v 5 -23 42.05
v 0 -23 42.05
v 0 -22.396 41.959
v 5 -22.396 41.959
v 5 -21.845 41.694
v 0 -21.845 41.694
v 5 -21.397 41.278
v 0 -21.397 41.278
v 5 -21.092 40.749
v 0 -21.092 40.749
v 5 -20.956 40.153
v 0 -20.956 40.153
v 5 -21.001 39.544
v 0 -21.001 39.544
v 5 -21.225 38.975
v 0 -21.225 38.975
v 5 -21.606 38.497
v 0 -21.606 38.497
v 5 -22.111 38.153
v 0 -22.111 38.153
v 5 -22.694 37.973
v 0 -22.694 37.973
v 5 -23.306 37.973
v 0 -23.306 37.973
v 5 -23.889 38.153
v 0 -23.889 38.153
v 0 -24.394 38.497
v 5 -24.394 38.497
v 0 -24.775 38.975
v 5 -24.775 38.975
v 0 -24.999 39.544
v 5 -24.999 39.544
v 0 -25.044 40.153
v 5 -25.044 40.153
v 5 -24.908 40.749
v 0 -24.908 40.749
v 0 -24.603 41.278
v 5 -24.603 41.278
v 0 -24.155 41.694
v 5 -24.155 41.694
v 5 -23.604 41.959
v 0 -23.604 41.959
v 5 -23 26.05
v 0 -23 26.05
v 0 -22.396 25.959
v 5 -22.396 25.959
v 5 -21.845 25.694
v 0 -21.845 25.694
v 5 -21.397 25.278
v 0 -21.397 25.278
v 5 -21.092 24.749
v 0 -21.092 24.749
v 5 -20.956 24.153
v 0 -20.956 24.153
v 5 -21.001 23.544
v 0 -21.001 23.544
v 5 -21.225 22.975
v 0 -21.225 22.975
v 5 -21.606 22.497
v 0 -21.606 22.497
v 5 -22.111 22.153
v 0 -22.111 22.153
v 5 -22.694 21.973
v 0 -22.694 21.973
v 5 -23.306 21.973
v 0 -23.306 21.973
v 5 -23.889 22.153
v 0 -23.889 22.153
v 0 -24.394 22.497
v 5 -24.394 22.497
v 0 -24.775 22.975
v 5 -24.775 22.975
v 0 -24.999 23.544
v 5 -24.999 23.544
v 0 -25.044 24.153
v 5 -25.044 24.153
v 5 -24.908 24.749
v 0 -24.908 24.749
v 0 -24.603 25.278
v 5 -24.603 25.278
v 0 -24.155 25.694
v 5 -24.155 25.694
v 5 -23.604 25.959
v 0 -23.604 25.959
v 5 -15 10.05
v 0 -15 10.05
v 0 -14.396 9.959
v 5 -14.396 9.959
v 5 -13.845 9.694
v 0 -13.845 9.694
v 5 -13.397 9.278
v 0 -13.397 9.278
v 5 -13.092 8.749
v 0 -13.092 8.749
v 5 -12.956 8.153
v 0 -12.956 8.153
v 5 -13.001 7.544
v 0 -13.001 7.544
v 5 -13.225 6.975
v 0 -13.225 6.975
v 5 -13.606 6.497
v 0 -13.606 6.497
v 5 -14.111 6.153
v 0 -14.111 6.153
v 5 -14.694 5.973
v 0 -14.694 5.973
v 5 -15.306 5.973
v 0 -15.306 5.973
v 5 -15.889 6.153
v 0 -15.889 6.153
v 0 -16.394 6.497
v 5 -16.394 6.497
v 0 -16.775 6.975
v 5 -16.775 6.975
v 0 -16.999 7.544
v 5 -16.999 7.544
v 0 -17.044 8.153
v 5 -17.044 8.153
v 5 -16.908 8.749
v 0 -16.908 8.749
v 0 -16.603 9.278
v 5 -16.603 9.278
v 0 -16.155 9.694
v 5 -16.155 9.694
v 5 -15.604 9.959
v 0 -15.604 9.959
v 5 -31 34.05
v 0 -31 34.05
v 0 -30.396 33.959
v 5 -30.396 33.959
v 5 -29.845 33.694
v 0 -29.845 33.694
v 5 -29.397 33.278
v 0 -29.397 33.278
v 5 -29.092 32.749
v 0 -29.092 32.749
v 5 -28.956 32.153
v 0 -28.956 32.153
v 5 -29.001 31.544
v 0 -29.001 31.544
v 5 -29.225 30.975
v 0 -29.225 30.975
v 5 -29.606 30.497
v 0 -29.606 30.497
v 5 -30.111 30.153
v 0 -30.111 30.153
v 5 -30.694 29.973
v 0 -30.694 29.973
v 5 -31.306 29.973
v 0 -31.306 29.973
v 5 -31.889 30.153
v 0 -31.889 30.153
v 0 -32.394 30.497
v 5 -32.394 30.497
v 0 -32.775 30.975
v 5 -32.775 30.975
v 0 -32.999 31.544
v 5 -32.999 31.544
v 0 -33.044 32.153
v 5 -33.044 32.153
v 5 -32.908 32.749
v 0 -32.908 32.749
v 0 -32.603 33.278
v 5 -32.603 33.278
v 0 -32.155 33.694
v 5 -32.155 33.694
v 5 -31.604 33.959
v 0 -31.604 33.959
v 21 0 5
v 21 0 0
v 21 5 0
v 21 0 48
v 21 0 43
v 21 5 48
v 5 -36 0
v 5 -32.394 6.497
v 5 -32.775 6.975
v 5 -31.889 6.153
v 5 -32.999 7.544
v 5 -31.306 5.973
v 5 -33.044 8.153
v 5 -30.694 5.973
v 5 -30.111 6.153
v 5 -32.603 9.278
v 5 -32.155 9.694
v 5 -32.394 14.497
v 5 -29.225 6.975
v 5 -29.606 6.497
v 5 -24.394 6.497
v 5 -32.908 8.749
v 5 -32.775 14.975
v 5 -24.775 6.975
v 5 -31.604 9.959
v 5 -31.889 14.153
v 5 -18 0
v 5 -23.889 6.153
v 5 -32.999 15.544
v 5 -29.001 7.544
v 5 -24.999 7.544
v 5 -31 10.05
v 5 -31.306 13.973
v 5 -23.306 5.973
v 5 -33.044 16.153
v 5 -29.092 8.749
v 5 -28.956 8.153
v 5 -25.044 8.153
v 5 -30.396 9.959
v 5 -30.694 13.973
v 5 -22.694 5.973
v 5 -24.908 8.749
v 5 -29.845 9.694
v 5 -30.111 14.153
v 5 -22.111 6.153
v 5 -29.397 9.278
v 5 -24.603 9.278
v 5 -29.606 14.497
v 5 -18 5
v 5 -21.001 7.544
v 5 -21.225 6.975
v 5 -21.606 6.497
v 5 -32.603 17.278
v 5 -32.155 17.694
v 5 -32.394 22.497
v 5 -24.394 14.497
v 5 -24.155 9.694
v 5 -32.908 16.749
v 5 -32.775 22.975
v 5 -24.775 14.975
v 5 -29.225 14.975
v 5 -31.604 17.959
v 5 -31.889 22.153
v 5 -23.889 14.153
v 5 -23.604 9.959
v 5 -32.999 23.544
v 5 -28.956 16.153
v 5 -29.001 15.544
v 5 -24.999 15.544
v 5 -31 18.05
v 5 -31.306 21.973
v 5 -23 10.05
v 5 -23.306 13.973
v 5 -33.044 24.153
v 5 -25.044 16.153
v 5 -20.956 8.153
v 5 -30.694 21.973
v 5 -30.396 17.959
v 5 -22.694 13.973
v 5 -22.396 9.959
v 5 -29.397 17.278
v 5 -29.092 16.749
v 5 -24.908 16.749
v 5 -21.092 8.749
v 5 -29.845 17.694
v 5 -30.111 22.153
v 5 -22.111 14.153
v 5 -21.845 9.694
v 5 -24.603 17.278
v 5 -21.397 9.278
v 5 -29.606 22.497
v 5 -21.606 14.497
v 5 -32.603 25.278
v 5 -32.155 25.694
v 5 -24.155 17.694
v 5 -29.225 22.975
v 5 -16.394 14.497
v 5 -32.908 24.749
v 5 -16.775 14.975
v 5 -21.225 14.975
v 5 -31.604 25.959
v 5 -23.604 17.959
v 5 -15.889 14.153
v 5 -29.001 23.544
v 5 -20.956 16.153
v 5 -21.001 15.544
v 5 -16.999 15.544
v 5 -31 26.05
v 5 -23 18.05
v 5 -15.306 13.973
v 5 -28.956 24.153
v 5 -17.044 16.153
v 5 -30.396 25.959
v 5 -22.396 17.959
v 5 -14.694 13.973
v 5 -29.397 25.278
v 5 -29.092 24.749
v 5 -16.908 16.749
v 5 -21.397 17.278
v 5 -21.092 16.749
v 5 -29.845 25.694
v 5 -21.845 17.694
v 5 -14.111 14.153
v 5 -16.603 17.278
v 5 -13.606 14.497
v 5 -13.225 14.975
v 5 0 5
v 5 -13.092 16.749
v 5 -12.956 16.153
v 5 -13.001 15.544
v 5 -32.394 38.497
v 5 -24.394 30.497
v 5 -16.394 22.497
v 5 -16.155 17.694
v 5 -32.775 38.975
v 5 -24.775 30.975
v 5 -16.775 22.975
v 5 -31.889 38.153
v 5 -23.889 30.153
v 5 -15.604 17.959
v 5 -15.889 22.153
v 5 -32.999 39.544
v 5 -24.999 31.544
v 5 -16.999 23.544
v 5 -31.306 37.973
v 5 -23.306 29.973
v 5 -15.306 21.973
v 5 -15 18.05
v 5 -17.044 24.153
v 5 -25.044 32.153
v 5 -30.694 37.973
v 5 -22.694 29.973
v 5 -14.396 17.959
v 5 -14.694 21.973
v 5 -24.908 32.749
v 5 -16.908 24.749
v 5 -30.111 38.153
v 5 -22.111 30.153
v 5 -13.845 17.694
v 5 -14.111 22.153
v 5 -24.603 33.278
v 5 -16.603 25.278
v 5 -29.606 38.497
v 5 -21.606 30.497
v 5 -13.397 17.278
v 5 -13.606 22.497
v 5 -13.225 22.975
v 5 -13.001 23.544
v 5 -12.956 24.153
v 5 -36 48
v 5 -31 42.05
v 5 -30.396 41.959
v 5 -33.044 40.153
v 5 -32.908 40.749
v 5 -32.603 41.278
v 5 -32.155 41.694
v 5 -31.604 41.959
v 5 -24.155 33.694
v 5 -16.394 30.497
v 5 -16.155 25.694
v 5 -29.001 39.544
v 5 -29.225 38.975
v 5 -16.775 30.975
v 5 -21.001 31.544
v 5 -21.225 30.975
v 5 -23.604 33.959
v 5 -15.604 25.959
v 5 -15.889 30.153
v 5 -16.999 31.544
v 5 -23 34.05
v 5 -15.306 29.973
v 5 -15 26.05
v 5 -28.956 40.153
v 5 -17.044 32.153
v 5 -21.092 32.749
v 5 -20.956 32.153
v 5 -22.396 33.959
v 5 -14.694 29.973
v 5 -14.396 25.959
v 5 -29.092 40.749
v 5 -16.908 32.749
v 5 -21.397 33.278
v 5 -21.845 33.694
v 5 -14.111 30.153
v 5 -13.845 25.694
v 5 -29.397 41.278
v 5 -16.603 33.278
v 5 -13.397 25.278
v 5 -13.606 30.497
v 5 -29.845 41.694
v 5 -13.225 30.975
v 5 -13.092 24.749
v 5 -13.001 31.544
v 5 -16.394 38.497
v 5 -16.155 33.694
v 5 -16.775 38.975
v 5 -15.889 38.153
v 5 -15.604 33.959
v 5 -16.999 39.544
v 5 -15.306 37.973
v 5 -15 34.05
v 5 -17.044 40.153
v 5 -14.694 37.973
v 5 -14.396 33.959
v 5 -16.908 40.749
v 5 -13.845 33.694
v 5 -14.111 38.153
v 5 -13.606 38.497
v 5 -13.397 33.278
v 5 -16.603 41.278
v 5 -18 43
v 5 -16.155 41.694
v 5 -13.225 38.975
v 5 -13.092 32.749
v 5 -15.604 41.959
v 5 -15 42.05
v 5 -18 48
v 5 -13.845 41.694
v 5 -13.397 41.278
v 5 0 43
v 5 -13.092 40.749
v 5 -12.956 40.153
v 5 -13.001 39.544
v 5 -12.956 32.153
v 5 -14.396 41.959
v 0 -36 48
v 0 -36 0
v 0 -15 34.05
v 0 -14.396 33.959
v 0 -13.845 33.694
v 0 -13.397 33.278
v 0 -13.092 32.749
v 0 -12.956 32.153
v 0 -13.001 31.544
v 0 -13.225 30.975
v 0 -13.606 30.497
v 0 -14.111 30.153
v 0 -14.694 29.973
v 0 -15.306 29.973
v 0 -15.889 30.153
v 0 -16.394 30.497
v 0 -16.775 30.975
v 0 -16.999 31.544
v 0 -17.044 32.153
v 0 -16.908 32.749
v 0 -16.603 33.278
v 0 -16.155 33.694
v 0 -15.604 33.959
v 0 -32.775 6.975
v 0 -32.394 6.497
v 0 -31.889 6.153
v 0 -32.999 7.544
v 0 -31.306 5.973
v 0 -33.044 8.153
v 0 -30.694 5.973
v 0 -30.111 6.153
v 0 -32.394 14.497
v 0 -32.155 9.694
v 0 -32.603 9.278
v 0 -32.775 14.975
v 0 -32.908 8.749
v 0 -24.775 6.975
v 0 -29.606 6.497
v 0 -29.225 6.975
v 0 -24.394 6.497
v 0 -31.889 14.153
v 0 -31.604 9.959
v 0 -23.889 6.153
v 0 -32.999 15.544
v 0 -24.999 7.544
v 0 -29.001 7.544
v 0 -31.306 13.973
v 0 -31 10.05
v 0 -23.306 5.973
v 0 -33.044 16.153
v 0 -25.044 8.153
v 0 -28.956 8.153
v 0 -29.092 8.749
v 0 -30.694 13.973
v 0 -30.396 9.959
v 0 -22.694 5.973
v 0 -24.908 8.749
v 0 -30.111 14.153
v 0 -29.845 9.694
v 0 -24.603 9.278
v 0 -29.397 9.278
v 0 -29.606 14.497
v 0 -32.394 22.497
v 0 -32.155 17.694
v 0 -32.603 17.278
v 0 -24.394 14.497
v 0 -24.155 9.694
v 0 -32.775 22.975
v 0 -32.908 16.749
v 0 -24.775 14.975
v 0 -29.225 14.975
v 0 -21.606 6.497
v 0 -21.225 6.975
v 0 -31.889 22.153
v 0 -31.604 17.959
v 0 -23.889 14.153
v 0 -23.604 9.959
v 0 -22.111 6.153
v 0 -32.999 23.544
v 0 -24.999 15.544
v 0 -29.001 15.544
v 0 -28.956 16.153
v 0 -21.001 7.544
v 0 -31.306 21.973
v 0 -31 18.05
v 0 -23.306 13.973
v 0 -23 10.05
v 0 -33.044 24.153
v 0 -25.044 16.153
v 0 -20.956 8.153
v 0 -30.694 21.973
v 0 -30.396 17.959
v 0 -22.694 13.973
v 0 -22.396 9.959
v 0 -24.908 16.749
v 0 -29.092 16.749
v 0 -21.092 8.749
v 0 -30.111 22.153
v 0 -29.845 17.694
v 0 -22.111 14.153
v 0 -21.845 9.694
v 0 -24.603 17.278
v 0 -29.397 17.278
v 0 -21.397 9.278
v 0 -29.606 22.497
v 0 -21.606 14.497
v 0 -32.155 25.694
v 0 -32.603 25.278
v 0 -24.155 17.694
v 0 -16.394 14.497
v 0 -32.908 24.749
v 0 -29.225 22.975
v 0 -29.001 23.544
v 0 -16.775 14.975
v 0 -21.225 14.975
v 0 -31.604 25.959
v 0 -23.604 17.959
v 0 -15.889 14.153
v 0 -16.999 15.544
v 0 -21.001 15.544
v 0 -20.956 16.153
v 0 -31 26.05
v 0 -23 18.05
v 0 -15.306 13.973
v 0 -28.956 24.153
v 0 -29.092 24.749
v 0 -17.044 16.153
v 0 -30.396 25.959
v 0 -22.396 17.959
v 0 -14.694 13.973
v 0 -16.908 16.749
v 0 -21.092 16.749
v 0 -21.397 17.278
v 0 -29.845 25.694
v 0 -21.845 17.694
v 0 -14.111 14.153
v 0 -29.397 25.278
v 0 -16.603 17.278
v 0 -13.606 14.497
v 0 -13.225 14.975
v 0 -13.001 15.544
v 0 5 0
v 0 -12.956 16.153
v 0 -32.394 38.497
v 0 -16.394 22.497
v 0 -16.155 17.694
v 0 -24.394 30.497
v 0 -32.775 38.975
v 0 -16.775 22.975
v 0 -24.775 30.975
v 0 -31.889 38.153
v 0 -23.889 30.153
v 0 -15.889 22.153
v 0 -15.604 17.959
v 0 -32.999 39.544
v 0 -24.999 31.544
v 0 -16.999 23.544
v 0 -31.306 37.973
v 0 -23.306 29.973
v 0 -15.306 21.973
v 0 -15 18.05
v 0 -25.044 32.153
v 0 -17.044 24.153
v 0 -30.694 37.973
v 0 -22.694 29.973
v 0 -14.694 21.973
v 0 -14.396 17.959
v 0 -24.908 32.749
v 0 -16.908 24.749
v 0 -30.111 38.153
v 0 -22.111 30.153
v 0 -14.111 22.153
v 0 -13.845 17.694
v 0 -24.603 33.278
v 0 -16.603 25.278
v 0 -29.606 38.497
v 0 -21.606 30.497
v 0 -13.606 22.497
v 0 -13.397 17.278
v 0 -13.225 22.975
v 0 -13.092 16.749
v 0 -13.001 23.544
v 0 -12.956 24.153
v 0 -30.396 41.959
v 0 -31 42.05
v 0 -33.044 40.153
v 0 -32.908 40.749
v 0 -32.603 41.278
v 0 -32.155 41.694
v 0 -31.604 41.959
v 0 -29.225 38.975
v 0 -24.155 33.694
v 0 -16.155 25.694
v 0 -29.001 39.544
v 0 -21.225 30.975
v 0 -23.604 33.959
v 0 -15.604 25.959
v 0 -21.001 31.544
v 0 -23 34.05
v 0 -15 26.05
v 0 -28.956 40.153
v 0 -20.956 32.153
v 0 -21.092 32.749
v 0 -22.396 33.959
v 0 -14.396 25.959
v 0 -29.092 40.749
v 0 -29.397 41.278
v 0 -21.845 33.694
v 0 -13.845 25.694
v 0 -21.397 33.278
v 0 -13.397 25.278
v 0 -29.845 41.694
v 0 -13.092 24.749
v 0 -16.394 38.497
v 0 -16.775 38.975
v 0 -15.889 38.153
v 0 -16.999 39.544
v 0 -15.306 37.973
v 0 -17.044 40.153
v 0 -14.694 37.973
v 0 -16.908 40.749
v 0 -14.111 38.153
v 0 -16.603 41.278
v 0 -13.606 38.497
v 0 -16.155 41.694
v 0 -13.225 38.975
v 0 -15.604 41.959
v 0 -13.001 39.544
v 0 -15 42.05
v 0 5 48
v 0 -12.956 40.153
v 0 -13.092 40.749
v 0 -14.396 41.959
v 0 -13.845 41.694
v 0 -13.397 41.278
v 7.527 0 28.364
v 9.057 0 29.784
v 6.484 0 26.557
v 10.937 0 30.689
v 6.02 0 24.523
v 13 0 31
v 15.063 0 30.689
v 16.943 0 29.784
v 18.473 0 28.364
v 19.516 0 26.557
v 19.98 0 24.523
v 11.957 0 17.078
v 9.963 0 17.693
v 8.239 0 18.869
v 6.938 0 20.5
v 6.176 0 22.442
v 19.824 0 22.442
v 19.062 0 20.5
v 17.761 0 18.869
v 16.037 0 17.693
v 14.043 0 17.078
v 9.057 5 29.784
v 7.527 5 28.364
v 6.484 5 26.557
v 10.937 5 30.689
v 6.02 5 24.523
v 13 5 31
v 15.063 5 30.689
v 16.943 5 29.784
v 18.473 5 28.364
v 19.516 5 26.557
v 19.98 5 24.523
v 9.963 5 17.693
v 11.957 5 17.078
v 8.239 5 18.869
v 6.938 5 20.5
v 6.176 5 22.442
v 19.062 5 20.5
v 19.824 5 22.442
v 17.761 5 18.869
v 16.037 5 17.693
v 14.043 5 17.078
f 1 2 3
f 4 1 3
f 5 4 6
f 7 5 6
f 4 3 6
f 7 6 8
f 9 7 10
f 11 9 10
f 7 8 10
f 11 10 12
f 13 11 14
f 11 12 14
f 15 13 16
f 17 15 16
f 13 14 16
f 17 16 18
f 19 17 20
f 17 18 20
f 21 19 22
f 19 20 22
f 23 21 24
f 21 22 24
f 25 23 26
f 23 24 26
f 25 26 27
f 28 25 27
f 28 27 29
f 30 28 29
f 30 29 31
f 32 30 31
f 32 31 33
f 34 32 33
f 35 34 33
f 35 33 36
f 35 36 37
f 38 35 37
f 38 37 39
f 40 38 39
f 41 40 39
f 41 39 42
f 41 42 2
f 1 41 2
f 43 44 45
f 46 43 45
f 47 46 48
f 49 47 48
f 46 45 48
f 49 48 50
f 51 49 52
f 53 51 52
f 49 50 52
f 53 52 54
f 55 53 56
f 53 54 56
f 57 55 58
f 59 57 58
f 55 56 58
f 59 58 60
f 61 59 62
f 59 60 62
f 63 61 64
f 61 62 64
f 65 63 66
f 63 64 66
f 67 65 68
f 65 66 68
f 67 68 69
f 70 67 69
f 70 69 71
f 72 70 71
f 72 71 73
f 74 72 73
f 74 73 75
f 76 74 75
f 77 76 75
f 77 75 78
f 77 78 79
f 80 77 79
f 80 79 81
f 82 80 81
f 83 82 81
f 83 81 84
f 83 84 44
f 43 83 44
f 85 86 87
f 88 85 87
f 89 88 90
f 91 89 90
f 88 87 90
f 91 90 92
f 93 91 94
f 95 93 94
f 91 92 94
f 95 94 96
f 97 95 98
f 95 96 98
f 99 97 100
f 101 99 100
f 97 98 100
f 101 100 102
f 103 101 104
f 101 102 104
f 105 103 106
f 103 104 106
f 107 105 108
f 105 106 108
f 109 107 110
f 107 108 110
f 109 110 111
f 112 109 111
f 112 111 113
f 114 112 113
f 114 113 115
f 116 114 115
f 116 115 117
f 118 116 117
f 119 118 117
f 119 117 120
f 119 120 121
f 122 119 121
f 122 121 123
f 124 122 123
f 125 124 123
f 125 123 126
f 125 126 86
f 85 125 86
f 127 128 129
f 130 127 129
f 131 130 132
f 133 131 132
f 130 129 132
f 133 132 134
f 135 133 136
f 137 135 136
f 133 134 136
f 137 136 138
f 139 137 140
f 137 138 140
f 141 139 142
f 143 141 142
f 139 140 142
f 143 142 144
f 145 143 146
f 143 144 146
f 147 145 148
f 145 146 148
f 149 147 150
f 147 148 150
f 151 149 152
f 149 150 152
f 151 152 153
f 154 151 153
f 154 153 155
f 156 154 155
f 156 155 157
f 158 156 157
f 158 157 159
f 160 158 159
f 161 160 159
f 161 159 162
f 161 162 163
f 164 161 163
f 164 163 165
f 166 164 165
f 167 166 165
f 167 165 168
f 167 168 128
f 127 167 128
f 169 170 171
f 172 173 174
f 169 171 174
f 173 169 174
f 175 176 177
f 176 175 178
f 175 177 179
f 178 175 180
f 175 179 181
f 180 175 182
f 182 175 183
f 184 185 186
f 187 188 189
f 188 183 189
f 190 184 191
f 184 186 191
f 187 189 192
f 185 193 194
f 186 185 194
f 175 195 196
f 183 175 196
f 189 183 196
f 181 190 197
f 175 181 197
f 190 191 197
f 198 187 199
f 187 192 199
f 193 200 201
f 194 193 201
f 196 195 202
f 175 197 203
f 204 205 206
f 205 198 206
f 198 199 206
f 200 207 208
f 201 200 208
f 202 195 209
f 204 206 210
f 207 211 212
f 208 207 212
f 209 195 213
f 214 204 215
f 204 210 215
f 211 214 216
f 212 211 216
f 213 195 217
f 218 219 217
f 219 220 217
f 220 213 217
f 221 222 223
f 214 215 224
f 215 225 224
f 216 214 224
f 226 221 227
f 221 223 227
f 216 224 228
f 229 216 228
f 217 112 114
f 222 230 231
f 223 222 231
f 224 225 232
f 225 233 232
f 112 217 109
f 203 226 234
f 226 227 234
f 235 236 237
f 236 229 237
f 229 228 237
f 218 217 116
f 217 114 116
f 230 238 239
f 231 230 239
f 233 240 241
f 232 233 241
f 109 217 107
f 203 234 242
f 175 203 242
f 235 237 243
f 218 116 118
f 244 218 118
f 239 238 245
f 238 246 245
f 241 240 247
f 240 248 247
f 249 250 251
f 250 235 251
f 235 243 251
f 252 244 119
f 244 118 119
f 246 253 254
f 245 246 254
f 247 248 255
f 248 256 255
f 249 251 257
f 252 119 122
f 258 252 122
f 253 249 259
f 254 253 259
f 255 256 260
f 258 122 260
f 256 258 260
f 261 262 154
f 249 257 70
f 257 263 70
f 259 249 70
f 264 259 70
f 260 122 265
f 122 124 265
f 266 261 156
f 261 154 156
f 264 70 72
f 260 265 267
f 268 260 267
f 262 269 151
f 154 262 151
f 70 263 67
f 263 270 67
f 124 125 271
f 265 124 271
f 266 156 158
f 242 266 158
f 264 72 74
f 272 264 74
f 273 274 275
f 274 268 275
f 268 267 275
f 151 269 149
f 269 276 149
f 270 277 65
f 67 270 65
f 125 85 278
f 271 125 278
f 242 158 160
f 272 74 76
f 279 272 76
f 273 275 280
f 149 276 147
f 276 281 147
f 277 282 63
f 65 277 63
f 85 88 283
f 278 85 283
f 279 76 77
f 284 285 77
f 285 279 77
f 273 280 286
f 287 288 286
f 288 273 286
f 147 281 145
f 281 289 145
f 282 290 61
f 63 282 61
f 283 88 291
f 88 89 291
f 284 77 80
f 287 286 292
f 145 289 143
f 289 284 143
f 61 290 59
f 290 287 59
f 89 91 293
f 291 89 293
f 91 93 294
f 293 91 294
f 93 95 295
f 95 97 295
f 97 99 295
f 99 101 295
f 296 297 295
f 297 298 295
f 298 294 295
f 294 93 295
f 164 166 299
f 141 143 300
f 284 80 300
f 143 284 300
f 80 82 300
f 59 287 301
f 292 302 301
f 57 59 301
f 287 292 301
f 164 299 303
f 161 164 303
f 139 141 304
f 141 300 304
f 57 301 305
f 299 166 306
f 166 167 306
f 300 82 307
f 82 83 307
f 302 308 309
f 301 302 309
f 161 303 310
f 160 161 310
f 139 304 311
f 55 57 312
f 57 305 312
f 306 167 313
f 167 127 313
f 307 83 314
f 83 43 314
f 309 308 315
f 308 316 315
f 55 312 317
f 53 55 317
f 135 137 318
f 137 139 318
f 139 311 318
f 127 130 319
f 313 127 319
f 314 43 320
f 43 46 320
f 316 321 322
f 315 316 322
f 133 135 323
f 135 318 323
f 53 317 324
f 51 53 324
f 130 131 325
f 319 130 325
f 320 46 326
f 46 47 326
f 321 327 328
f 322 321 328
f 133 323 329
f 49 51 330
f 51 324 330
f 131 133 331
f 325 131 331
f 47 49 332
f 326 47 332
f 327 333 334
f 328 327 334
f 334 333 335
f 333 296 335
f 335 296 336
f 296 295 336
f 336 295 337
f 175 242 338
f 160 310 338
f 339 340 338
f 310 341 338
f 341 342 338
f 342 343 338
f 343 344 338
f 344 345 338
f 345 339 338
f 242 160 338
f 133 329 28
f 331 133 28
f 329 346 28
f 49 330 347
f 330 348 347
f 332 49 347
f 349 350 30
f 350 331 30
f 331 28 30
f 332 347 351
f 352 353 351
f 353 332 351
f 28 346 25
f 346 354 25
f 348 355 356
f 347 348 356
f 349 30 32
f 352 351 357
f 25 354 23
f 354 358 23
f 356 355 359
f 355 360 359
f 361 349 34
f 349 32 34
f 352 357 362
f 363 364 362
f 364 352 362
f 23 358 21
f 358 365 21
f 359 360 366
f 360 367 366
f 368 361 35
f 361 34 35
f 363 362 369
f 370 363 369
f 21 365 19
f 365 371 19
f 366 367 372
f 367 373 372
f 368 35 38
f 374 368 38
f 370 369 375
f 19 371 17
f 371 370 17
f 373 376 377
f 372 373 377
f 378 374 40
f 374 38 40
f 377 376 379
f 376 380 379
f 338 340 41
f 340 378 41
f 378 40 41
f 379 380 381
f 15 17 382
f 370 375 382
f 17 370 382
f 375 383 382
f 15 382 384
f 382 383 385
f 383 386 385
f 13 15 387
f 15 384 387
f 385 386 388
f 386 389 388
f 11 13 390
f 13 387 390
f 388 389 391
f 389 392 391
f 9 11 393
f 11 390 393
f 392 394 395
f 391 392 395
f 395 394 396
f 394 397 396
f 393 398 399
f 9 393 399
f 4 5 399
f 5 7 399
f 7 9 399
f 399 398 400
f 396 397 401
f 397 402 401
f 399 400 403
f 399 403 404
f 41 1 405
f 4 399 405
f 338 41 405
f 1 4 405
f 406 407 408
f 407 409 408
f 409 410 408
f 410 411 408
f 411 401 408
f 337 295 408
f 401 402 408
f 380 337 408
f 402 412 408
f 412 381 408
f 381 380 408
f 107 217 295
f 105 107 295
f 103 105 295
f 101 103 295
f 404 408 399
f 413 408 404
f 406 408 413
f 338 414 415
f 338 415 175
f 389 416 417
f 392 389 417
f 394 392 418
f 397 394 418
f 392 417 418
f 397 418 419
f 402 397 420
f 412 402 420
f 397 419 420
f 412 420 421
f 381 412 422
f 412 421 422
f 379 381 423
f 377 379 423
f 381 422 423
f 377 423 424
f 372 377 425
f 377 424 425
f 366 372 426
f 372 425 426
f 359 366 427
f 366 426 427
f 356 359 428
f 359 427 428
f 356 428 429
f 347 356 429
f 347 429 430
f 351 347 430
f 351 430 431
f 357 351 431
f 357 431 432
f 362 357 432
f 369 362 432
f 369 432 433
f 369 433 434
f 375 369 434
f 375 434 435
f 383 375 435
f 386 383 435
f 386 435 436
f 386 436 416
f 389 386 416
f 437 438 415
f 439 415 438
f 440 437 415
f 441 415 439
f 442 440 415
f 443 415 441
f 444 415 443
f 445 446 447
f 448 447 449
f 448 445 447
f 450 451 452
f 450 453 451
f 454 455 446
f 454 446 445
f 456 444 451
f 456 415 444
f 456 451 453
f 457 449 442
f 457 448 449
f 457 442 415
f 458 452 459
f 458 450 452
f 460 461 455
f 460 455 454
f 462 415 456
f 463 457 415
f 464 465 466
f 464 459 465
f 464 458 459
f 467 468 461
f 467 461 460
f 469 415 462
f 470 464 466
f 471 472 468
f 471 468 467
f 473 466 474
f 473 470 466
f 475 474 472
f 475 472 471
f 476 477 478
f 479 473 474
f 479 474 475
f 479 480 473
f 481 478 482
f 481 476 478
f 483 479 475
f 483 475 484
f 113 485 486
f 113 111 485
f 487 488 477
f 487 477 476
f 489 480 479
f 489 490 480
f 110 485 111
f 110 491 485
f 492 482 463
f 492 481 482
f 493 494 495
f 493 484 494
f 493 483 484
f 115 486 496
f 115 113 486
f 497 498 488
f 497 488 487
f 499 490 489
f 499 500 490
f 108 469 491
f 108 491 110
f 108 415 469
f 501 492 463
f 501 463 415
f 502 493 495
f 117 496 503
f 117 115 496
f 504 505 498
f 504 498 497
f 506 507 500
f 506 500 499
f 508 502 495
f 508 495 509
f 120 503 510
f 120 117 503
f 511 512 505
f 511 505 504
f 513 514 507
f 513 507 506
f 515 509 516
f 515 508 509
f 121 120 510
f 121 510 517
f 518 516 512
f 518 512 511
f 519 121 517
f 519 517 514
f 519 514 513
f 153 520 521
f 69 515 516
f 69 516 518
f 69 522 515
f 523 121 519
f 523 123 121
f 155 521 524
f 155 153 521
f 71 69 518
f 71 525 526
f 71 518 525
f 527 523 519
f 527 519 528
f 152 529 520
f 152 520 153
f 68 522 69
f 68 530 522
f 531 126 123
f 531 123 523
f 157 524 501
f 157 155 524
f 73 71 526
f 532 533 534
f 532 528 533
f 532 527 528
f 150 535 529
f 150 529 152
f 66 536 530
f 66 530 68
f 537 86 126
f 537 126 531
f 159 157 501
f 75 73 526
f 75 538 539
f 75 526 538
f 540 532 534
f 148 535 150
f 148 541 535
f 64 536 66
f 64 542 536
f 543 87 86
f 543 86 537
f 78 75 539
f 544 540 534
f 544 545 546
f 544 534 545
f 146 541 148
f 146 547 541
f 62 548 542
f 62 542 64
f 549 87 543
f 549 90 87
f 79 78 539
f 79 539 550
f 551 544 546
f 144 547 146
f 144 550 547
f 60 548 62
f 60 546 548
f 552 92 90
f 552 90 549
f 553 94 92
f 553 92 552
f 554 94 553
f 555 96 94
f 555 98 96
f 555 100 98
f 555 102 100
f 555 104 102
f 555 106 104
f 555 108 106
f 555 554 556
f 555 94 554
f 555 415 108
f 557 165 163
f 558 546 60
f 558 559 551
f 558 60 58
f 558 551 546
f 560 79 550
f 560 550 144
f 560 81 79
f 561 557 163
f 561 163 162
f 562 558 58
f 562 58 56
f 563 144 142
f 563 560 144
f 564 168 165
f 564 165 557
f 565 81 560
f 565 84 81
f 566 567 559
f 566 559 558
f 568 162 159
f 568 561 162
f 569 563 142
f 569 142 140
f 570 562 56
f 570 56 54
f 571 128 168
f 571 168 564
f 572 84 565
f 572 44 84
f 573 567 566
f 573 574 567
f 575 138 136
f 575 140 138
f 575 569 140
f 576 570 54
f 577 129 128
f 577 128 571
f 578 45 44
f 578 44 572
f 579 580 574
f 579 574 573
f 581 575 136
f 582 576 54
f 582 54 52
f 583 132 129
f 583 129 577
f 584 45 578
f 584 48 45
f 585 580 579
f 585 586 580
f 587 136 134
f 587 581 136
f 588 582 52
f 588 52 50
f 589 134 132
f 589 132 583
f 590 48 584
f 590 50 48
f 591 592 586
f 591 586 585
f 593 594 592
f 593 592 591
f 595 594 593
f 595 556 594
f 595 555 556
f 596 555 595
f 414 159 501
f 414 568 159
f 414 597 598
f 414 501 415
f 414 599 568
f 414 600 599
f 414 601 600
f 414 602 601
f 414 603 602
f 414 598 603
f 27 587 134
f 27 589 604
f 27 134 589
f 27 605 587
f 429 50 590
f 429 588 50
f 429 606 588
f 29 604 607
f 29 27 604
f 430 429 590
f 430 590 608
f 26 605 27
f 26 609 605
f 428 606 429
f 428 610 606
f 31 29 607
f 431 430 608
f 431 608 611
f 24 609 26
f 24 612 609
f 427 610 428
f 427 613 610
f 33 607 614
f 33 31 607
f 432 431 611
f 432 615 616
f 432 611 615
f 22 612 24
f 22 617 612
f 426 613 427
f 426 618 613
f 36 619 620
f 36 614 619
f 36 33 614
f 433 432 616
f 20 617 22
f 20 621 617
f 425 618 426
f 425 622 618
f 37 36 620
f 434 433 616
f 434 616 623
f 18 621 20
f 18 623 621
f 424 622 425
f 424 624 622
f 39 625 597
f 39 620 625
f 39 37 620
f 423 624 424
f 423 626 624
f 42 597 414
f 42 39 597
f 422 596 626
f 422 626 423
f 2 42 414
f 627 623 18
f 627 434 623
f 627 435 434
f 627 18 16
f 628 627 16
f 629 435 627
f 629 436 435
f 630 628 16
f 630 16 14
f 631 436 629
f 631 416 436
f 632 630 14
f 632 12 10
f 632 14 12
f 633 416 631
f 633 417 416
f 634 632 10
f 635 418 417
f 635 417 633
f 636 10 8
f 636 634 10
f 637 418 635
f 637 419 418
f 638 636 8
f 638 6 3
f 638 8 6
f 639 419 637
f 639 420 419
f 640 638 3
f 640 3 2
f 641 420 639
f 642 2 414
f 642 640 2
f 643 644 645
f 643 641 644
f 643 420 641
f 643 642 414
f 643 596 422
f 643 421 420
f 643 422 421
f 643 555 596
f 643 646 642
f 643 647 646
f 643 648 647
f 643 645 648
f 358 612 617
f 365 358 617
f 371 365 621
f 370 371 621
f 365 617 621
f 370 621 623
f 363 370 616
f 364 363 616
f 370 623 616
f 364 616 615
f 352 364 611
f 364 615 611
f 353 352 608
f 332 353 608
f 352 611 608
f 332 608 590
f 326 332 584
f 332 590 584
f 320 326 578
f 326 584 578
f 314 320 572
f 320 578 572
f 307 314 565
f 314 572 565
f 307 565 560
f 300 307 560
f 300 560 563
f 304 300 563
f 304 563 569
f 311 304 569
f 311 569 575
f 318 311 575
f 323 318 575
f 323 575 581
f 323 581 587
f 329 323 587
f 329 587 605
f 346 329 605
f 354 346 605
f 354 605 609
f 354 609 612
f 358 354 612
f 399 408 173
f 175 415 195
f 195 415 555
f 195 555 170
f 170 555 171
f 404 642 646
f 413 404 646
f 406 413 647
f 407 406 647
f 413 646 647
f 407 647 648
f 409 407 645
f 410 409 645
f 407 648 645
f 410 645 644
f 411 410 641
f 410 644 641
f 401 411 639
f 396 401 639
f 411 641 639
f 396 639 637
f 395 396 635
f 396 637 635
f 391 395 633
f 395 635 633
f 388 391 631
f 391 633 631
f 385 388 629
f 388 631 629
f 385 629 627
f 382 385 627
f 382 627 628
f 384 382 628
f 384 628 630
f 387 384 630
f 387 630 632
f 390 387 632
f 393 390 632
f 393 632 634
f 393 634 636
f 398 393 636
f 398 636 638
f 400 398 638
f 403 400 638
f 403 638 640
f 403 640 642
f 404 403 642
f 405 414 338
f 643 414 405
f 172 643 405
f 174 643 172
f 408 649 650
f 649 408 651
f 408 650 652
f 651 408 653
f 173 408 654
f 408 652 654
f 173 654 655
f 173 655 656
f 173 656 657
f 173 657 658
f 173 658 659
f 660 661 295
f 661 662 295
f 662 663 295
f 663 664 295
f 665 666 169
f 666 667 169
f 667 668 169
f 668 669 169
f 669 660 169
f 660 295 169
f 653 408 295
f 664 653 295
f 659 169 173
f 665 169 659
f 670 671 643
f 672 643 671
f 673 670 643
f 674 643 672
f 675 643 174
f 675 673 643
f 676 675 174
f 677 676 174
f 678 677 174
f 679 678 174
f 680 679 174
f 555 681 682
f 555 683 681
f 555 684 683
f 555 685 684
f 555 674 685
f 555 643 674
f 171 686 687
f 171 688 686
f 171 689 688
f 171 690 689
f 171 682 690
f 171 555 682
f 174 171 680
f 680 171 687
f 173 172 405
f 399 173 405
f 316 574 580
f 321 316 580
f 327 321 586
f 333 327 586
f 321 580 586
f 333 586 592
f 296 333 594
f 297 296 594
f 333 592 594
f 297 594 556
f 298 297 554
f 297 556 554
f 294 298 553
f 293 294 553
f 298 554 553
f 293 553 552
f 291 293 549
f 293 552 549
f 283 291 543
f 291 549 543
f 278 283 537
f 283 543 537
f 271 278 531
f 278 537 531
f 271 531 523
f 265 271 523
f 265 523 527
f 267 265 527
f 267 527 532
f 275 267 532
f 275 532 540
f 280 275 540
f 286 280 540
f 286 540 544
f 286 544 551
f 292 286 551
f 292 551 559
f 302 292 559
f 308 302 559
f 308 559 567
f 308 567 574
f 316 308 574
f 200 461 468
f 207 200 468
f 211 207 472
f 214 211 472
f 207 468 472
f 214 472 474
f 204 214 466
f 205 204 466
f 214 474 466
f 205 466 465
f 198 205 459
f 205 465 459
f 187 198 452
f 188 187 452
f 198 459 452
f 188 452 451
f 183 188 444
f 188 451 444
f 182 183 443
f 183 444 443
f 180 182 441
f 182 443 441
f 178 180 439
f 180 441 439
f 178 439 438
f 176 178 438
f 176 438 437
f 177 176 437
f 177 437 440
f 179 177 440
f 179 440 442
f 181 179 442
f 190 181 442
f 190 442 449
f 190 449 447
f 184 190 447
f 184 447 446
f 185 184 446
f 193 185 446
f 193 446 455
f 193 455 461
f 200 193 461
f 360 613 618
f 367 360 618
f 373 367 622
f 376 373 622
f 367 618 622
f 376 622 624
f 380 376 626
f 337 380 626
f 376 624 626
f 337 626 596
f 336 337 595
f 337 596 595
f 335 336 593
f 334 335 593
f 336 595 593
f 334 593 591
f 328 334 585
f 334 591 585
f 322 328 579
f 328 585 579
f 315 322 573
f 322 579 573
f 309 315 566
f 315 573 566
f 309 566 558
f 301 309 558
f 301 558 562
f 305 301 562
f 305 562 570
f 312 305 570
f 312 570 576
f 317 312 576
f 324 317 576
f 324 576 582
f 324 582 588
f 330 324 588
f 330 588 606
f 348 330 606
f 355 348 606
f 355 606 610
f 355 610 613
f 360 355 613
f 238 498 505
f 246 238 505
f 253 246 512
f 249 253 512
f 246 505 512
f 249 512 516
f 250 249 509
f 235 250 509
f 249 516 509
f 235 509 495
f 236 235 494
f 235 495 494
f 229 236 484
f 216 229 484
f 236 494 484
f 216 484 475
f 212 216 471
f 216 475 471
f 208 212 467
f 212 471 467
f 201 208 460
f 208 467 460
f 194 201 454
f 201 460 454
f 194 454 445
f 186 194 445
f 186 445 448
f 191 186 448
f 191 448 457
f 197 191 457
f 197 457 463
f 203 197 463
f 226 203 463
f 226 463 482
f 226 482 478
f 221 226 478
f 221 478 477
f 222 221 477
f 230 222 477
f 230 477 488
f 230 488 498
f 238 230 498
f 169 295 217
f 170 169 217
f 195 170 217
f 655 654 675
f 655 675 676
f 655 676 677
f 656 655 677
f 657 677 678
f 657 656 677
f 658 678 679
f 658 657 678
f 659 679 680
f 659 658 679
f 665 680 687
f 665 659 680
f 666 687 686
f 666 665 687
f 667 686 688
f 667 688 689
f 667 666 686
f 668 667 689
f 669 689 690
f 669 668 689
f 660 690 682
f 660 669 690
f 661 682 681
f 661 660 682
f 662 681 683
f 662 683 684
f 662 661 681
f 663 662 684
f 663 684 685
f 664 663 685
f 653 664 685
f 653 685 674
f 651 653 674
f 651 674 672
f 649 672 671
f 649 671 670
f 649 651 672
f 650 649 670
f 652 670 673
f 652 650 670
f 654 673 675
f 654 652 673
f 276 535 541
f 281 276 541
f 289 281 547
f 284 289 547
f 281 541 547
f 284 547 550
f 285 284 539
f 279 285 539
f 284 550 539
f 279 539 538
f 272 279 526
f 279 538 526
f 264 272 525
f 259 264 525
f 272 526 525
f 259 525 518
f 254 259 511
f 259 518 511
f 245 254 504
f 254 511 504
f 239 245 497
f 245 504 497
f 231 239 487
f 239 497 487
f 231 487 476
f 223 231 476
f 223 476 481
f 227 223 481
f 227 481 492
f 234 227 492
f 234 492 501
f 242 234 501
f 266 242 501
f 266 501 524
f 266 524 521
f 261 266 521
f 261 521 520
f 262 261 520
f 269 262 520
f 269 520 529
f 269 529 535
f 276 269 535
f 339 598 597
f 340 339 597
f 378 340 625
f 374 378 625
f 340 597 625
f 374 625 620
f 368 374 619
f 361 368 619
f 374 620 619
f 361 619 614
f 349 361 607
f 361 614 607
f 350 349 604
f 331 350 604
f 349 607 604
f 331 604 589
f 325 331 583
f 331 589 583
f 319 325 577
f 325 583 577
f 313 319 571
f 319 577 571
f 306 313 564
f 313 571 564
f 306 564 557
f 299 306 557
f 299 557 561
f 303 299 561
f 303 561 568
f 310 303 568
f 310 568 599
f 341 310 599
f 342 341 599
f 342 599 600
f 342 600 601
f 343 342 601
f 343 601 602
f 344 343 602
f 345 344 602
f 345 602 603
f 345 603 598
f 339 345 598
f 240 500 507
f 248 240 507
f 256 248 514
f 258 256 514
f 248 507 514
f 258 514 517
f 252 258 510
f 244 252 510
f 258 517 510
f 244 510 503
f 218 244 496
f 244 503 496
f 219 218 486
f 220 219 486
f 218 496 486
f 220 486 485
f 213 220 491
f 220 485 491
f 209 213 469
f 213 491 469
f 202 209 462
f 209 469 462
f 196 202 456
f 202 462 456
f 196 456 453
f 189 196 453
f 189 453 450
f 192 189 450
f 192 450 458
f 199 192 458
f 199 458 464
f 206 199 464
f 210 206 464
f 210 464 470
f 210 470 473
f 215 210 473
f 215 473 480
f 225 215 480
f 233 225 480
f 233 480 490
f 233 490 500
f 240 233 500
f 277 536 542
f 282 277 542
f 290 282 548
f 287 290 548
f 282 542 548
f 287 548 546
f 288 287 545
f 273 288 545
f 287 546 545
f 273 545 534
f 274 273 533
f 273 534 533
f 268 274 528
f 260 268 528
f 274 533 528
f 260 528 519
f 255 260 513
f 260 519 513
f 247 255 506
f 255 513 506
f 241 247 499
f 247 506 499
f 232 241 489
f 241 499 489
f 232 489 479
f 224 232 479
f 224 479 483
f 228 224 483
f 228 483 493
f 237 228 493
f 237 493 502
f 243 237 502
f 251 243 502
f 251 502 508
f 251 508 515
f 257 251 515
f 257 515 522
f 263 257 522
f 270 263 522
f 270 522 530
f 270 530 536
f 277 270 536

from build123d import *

# Parameters (mm, degrees)
SKETCH1_W           = 21
SKETCH1_H           = 48
SKETCH1_R           = 7
BOSS_EXTRUDE1_DEPTH = 5
SKETCH2_W           = 5
SKETCH2_H           = 48
BOSS_EXTRUDE2_DEPTH = 36
SKETCH4_W           = 16
SKETCH4_H           = 5
BOSS_EXTRUDE3_DEPTH = 18
CUT_EXTRUDE1_DEPTH  = 64.568860301
SKETCH6_R           = 2.05
CUT_EXTRUDE2_DEPTH  = 18


with BuildPart() as part:
    # Sketch1 → Boss-Extrude1 (new body)
    with BuildSketch(Plane(origin=(0, 0, 0), x_dir=(1, 0, 0), z_dir=(0, 1, 0))):
        with Locations((10.5, -24)):
            Rectangle(SKETCH1_W, SKETCH1_H)
        with Locations(Location((13, -24, 0), (0, 0, 270))):
            Circle(SKETCH1_R, mode=Mode.SUBTRACT)
    extrude(amount=BOSS_EXTRUDE1_DEPTH)

    # Sketch2 → Boss-Extrude2 (add)
    with BuildSketch(Plane.XZ):
        with Locations((2.5, 24)):
            Rectangle(SKETCH2_W, SKETCH2_H)
    extrude(amount=BOSS_EXTRUDE2_DEPTH)

    # Sketch4 → Boss-Extrude3 (add)
    with BuildSketch(Plane.XZ):
        with Locations((13, 45.5)):
            Rectangle(SKETCH4_W, SKETCH4_H)
        with Locations((13, 2.5)):
            Rectangle(SKETCH4_W, SKETCH4_H)
    extrude(amount=BOSS_EXTRUDE3_DEPTH)

    # Sketch5 → Cut-Extrude1 (cut, through all)
    with BuildSketch(Plane.XY.offset(48)):
        Polygon((21, 0), (5, -18), (21, -18), align=None)
    extrude(amount=-CUT_EXTRUDE1_DEPTH, mode=Mode.SUBTRACT)

    # Sketch6 → Cut-Extrude2 (cut)
    with BuildSketch(Plane.ZY):
        with Locations((8, -31)):
            Circle(SKETCH6_R)
        with Locations((16, -31)):
            Circle(SKETCH6_R)
        with Locations((24, -31)):
            Circle(SKETCH6_R)
        with Locations((32, -31)):
            Circle(SKETCH6_R)
        with Locations((40, -31)):
            Circle(SKETCH6_R)
        with Locations((16, -23)):
            Circle(SKETCH6_R)
        with Locations((24, -23)):
            Circle(SKETCH6_R)
        with Locations((32, -23)):
            Circle(SKETCH6_R)
        with Locations((40, -23)):
            Circle(SKETCH6_R)
        with Locations((16, -15)):
            Circle(SKETCH6_R)
        with Locations((24, -15)):
            Circle(SKETCH6_R)
        with Locations((32, -15)):
            Circle(SKETCH6_R)
        with Locations((40, -15)):
            Circle(SKETCH6_R)
        with Locations((8, -23)):
            Circle(SKETCH6_R)
        with Locations((8, -15)):
            Circle(SKETCH6_R)
    extrude(amount=-CUT_EXTRUDE2_DEPTH, mode=Mode.SUBTRACT)


solid = part.part
